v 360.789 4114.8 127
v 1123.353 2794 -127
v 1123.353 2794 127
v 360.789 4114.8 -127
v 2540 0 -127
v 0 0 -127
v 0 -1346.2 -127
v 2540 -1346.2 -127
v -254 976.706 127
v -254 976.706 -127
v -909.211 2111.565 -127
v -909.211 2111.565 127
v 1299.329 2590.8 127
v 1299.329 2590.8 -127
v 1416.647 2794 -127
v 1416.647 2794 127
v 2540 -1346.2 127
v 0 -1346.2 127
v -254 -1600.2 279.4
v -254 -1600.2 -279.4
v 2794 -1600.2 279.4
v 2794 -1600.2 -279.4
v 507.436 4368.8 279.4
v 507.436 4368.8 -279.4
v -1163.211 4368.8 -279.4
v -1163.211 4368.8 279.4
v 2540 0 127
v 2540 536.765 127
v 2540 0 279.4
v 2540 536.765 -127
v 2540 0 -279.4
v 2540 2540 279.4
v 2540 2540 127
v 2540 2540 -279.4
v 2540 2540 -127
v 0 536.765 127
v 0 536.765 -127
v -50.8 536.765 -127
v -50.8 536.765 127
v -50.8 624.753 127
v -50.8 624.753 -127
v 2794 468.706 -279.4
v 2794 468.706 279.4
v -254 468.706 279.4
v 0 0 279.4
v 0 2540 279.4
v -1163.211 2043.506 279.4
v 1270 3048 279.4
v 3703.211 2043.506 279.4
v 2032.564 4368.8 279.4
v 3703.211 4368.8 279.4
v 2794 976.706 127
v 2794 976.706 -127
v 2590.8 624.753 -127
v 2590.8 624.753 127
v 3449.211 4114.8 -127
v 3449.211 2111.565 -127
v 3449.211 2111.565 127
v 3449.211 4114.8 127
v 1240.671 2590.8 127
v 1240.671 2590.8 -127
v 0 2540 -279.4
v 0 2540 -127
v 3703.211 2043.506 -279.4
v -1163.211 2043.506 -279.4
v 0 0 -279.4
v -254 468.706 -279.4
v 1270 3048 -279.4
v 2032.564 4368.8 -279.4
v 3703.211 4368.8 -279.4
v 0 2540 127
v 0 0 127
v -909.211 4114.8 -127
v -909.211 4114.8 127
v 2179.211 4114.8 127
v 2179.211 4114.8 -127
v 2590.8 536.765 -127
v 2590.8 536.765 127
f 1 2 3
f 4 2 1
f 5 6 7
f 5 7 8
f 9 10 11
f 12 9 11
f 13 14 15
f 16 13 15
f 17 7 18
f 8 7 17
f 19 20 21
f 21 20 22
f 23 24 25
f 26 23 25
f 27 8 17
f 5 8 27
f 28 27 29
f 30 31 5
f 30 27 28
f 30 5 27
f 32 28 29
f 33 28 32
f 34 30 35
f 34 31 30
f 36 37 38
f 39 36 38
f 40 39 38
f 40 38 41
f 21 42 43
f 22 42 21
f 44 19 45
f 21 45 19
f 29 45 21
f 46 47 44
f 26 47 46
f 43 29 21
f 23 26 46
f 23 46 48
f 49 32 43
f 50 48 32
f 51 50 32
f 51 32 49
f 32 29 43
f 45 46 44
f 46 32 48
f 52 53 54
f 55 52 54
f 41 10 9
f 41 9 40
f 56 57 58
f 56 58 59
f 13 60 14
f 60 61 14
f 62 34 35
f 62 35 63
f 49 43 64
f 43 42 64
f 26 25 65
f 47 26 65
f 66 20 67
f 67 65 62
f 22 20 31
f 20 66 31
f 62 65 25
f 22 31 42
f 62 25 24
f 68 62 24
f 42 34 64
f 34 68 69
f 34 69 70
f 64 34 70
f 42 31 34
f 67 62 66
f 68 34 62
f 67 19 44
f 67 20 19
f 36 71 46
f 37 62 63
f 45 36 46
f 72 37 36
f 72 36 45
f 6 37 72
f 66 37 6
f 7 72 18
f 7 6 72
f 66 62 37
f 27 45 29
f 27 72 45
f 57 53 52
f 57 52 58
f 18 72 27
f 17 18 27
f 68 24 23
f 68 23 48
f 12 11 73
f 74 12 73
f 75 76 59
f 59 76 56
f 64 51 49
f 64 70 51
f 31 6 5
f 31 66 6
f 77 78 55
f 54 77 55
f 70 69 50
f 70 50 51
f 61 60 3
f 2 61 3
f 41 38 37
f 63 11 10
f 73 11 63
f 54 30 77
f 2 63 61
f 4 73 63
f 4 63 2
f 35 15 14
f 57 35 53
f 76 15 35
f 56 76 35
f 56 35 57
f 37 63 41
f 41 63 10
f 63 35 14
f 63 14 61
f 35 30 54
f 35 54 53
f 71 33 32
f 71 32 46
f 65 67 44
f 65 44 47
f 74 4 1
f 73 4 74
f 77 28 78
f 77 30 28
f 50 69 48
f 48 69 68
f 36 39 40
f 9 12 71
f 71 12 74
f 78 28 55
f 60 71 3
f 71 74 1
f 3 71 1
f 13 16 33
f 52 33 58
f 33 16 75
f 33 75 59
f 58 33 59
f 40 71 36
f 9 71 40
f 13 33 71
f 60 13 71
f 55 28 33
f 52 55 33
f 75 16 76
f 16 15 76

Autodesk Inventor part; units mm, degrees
ref_plane "YZ Plane" through (0, 0, 0) normal (1, 0, 0) x (0, 1, 0)
ref_plane "XZ Plane" through (0, 0, 0) normal (0, 1, 0) x (-1, 0, 0)
sketch "Sketch1" plane through (0, 0, 0) normal (0, 0, 1) x (1, 0, 0)
  line L0 (0, 0) -> (2540, 0)
  line L1 (2540, 0) -> (2540, 2540)
  line L2 (2540, 2540) -> (0, 2540)
  line L3 (0, 2540) -> (0, 0)
  line L4 (-254, 2794) -> (2794, 2794)
  line L5 (2794, 2794) -> (2794, -254)
  line L6 (2794, -254) -> (-254, -254)
  line L7 (-254, -254) -> (-254, 2794)
  line L8 (1270, 0) -> (1270, 1270) construction
  dimension "d0" = 2540
  dimension "d1" = 2540
  dimension "d3" = 254
  dimension "d4" = 254
  dimension "d5" = 254
  dimension "d6" = 254
  dimension "d932" = 1270
extrude "frame" add sketch "Sketch1" along normal mid plane 558.8
ref_plane "middle of part" through (0, 0, 0) normal (0, 0, 1) x (1, 0, 0)
sketch "Sketch8" plane through (0, 0, 0) normal (0, 0, 1) x (1, 0, 0)
  line L0 (2540, 0) -> (0, 0) projected
  line L1 (0, 0) -> (0, -254)
  line L2 (-254, -254) -> (2794, -254) projected
  line L3 (0, -254) -> (2540, -254)
  line L4 (2540, 2540) -> (2540, 0) projected
  line L5 (2540, -254) -> (2540, 0)
  line L6 (2540, 0) -> (0, 0)
extrude "door slot bottom" cut sketch "Sketch8" along normal mid plane 254
sketch "Sketch7" plane through (0, 0, 0) normal (0, 0, 1) x (1, 0, 0)
  line L0 (102.3298, 595.8453) -> (-251.9439, 1209.4654) construction
  line L1 (-254, -254) -> (-254, 2794) projected
  line L2 (1123.353, 2794) -> (-254, 2794)
  line L3 (-254, 2794) -> (-254, 976.7061)
  line L4 (-254, 976.7061) -> (-50.8, 624.7533)
  line L5 (0, 2540) -> (0, 0) projected
  line L6 (0, 536.7652) -> (0, 2540)
  line L7 (0, 2540) -> (1270, 2540)
  line L8 (1270, 1270) -> (1270, 1044.9425)
  line L9 (1270, 1270) -> (0, 536.7652)
  line L10 (1270, 1620.4707) -> (1270, 1965.6323) construction
  line L11 (1240.6706, 2590.8) -> (1123.353, 2794)
  line L12 (0, 536.7652) -> (-50.8, 536.7652)
  line L13 (-50.8, 536.7652) -> (-50.8, 624.7533)
  line L14 (2437.6702, 595.8453) -> (2791.9439, 1209.4654) construction
  line L15 (2794, -254) -> (2794, 2794)
  line L16 (1416.647, 2794) -> (2794, 2794)
  line L17 (2794, 2794) -> (2794, 976.7061)
  line L18 (2794, 976.7061) -> (2590.8, 624.7533)
  line L19 (2540, 2540) -> (2540, 0)
  line L20 (2540, 536.7652) -> (2540, 2540)
  line L21 (2540, 2540) -> (1270, 2540)
  line L22 (1270, 1270) -> (2540, 536.7652)
  line L23 (1299.3294, 2590.8) -> (1416.647, 2794)
  line L24 (2540, 536.7652) -> (2590.8, 536.7652)
  line L25 (2590.8, 536.7652) -> (2590.8, 624.7533)
  line L26 (1240.6706, 2590.8) -> (1299.3294, 2590.8)
  dimension "d878" = 60
  dimension "d889" = 50.8
  dimension "d901" = 50.8
extrude "top left and right slots" cut sketch "Sketch7" along normal mid plane 254 contours L1 L2 L11 L26 L23 L16 L15 L18 L25 L24 L19 L21 L7 L5 L12 L13 L4
sketch "Sketch13" plane through (0, 0, 0) normal (0, 0, 1) x (1, 0, 0)
  line L0 (0, -254) -> (0, 0) projected
  line L1 (0, -50.8) -> (0, -1346.2)
  line L2 (0, -1346.2) -> (2540, -1346.2)
  line L3 (2540, 0) -> (2540, -254) projected
  line L4 (2540, -1346.2) -> (2540, -50.8)
  line L5 (2794, -254) -> (-254, -254) projected
  line L6 (2540, -50.8) -> (0, -50.8) projected
  line L7 (2540, -50.8) -> (0, -50.8)
  line L8 (-50.8, 624.7533) -> (-254, 976.7061) projected
  line L9 (1240.6706, 2590.8) -> (1299.3294, 2590.8) projected
  line L10 (507.4358, 4368.8) -> (-1163.2112, 4368.8)
  line L11 (-1163.2112, 4368.8) -> (-1163.2112, 2043.5061)
  line L12 (1270, 3756.6434) -> (1270, 722.7588) construction
  line L13 (2540, 2590.8) -> (1299.3294, 2590.8)
  line L14 (1123.353, 2794) -> (1240.6706, 2590.8) projected
  line L15 (-50.8, 116.7533) -> (-1163.2112, 2043.5061)
  line L16 (-50.8, 624.7533) -> (-909.2112, 2111.5652)
  line L17 (-909.2112, 2111.5652) -> (-909.2112, 4114.8)
  line L18 (-50.8, 536.7652) -> (-50.8, 2540) projected
  line L19 (360.7888, 4114.8) -> (-909.2112, 4114.8)
  line L20 (1240.6706, 2590.8) -> (360.7888, 4114.8)
  line L21 (507.4358, 4368.8) -> (1270, 3048)
  line L22 (0, -50.8) -> (-254, -50.8)
  line L23 (-254, -254) -> (-254, 2794) projected
  line L24 (-254, -50.8) -> (-254, -1600.2)
  line L25 (-254, -1600.2) -> (2794, -1600.2)
  line L26 (2794, -1600.2) -> (2794, -50.8)
  line L27 (2794, 2794) -> (2794, -254) projected
  line L28 (2540, -50.8) -> (2794, -50.8)
  line L29 (1240.6706, 2590.8) -> (1270, 2590.8)
  line L30 (0, 2590.8) -> (2540, 2590.8) projected
  line L31 (1270, 2590.8) -> (1270, 3048)
  line L32 (-50.8, 536.7652) -> (-50.8, 624.7533) projected
  line L33 (-50.8, 624.7533) -> (-50.8, 116.7533)
  line L34 (2032.5642, 4368.8) -> (3703.2112, 4368.8)
  line L35 (3703.2112, 4368.8) -> (3703.2112, 2043.5061)
  line L36 (1416.647, 2794) -> (1299.3294, 2590.8)
  line L37 (2590.8, 116.7533) -> (3703.2112, 2043.5061)
  line L38 (2590.8, 624.7533) -> (3449.2112, 2111.5652)
  line L39 (3449.2112, 2111.5652) -> (3449.2112, 4114.8)
  line L40 (2179.2112, 4114.8) -> (3449.2112, 4114.8)
  line L41 (1299.3294, 2590.8) -> (2179.2112, 4114.8)
  line L42 (2032.5642, 4368.8) -> (1270, 3048)
  line L43 (1299.3294, 2590.8) -> (1270, 2590.8)
  line L44 (2590.8, 624.7533) -> (2590.8, 116.7533)
  line L45 (2794, 2794) -> (-254, 2794) projected
  dimension "d878" = 60
  dimension "d889" = 50.8
  dimension "d901" = 50.8
  dimension "d903" = 1295.4
  dimension "d907" = 254
  dimension "d916" = 254
  dimension "d917" = 254
  dimension "d919" = 254
  dimension "d920" = 254
  dimension "d921" = 254
  dimension "d926" = 655.2112
  dimension "d927" = 1320.8
extrude "door recieves" add sketch "Sketch13" along normal mid plane 558.8 contours L1 L2 L4 L5 L26 L25 L24 | L3 L28 L26 L5 | L23 L8 L18 L33 L15 | L15 L11 L10 L21 L31 L45 L20 L19 L17 L16 L23 | L37 L44 L38 L27 | L27 L38 L39 L40 L41 L45 L31 L42 L34 L35 L37 | L45 L31 L9 L14 | L36 L9 L31 L45
sketch "Sketch14" plane through (0, 0, 279.4) normal (0, 0, 1) x (1, 0, 0)
  line L0 (-254, 976.7061) -> (-909.2112, 2111.5652) projected
  line L1 (-909.2112, 2111.5652) -> (-909.2112, 4114.8) projected
  line L2 (-254, 976.7061) -> (-909.2112, 2111.5652)
  line L3 (-909.2112, 2111.5652) -> (-909.2112, 4114.8)
  line L4 (-909.2112, 4114.8) -> (360.7888, 4114.8)
  line L5 (-254, 2794) -> (1123.353, 2794) projected
  line L6 (360.7888, 4114.8) -> (1123.353, 2794)
  line L7 (1123.353, 2794) -> (-254, 2794)
  line L8 (-254, 2794) -> (-254, 976.7061)
  line L9 (3449.2112, 4114.8) -> (2179.2112, 4114.8) projected
  line L10 (1416.647, 2794) -> (2179.2112, 4114.8)
  line L11 (2179.2112, 4114.8) -> (3449.2112, 4114.8)
  line L12 (2794, 976.7061) -> (3449.2112, 2111.5652) projected
  line L13 (3449.2112, 4114.8) -> (3449.2112, 2111.5652)
  line L14 (2794, 2794) -> (2794, 976.7061) projected
  line L15 (3449.2112, 2111.5652) -> (2794, 976.7061)
  line L16 (2794, 976.7061) -> (2794, 2794)
  line L17 (2794, 2794) -> (1416.647, 2794)
  line L18 (2540, -254) -> (0, -254) projected
  line L19 (0, -1346.2) -> (0, -254) projected
  line L20 (0, -254) -> (0, -1346.2)
  line L21 (2540, -1346.2) -> (2540, -254) projected
  line L22 (0, -1346.2) -> (2540, -1346.2)
  line L23 (2540, -1346.2) -> (2540, -254)
  line L24 (2540, -254) -> (0, -254)
  point P0 (0, 0)
extrude "front hide door" add sketch "Sketch14" against normal up to surface (152.4 mm away)
sketch "Sketch15" plane through (0, 0, -279.4) normal (0, 0, -1) x (-1, 0, 0)
  line L0 (-1416.647, 2794) -> (-2794, 2794) projected
  line L1 (-3449.2112, 4114.8) -> (-2179.2112, 4114.8) projected
  line L2 (-1416.647, 2794) -> (-2179.2112, 4114.8)
  line L3 (-2179.2112, 4114.8) -> (-3449.2112, 4114.8)
  line L4 (-3449.2112, 2111.5652) -> (-3449.2112, 4114.8) projected
  line L5 (-3449.2112, 4114.8) -> (-3449.2112, 2111.5652)
  line L6 (-3449.2112, 2111.5652) -> (-2794, 976.7061)
  line L7 (-2794, 976.7061) -> (-2794, 2794)
  line L8 (-2794, 2794) -> (-1416.647, 2794)
  line L9 (254, 2794) -> (-1123.353, 2794) projected
  line L10 (-360.7888, 4114.8) -> (909.2112, 4114.8) projected
  line L11 (-1123.353, 2794) -> (-360.7888, 4114.8)
  line L12 (-360.7888, 4114.8) -> (909.2112, 4114.8)
  line L13 (909.2112, 2111.5652) -> (254, 976.7061) projected
  line L14 (909.2112, 4114.8) -> (909.2112, 2111.5652)
  line L15 (909.2112, 2111.5652) -> (254, 976.7061)
  line L16 (254, 976.7061) -> (254, 2794) projected
  line L17 (254, 976.7061) -> (254, 2794)
  line L18 (254, 2794) -> (-1123.353, 2794)
  line L19 (0, -254) -> (0, -1346.2) projected
  line L20 (0, -254) -> (0, -1346.2)
  line L21 (0, -1346.2) -> (-2540, -1346.2) projected
  line L22 (0, -1346.2) -> (-2540, -1346.2)
  line L23 (-2540, -254) -> (0, -254) projected
  line L24 (-2540, -1346.2) -> (-2540, -254)
  line L25 (-2540, -254) -> (0, -254)
  point P0 (0, 0)
extrude "gap for door pieces" add sketch "Sketch15" against normal up to surface (152.4 mm away)
equation "\"d3\" = d4"
equation "\"d5\" = d4"
equation "\"d6\" = d4"
properties part number "end door"
